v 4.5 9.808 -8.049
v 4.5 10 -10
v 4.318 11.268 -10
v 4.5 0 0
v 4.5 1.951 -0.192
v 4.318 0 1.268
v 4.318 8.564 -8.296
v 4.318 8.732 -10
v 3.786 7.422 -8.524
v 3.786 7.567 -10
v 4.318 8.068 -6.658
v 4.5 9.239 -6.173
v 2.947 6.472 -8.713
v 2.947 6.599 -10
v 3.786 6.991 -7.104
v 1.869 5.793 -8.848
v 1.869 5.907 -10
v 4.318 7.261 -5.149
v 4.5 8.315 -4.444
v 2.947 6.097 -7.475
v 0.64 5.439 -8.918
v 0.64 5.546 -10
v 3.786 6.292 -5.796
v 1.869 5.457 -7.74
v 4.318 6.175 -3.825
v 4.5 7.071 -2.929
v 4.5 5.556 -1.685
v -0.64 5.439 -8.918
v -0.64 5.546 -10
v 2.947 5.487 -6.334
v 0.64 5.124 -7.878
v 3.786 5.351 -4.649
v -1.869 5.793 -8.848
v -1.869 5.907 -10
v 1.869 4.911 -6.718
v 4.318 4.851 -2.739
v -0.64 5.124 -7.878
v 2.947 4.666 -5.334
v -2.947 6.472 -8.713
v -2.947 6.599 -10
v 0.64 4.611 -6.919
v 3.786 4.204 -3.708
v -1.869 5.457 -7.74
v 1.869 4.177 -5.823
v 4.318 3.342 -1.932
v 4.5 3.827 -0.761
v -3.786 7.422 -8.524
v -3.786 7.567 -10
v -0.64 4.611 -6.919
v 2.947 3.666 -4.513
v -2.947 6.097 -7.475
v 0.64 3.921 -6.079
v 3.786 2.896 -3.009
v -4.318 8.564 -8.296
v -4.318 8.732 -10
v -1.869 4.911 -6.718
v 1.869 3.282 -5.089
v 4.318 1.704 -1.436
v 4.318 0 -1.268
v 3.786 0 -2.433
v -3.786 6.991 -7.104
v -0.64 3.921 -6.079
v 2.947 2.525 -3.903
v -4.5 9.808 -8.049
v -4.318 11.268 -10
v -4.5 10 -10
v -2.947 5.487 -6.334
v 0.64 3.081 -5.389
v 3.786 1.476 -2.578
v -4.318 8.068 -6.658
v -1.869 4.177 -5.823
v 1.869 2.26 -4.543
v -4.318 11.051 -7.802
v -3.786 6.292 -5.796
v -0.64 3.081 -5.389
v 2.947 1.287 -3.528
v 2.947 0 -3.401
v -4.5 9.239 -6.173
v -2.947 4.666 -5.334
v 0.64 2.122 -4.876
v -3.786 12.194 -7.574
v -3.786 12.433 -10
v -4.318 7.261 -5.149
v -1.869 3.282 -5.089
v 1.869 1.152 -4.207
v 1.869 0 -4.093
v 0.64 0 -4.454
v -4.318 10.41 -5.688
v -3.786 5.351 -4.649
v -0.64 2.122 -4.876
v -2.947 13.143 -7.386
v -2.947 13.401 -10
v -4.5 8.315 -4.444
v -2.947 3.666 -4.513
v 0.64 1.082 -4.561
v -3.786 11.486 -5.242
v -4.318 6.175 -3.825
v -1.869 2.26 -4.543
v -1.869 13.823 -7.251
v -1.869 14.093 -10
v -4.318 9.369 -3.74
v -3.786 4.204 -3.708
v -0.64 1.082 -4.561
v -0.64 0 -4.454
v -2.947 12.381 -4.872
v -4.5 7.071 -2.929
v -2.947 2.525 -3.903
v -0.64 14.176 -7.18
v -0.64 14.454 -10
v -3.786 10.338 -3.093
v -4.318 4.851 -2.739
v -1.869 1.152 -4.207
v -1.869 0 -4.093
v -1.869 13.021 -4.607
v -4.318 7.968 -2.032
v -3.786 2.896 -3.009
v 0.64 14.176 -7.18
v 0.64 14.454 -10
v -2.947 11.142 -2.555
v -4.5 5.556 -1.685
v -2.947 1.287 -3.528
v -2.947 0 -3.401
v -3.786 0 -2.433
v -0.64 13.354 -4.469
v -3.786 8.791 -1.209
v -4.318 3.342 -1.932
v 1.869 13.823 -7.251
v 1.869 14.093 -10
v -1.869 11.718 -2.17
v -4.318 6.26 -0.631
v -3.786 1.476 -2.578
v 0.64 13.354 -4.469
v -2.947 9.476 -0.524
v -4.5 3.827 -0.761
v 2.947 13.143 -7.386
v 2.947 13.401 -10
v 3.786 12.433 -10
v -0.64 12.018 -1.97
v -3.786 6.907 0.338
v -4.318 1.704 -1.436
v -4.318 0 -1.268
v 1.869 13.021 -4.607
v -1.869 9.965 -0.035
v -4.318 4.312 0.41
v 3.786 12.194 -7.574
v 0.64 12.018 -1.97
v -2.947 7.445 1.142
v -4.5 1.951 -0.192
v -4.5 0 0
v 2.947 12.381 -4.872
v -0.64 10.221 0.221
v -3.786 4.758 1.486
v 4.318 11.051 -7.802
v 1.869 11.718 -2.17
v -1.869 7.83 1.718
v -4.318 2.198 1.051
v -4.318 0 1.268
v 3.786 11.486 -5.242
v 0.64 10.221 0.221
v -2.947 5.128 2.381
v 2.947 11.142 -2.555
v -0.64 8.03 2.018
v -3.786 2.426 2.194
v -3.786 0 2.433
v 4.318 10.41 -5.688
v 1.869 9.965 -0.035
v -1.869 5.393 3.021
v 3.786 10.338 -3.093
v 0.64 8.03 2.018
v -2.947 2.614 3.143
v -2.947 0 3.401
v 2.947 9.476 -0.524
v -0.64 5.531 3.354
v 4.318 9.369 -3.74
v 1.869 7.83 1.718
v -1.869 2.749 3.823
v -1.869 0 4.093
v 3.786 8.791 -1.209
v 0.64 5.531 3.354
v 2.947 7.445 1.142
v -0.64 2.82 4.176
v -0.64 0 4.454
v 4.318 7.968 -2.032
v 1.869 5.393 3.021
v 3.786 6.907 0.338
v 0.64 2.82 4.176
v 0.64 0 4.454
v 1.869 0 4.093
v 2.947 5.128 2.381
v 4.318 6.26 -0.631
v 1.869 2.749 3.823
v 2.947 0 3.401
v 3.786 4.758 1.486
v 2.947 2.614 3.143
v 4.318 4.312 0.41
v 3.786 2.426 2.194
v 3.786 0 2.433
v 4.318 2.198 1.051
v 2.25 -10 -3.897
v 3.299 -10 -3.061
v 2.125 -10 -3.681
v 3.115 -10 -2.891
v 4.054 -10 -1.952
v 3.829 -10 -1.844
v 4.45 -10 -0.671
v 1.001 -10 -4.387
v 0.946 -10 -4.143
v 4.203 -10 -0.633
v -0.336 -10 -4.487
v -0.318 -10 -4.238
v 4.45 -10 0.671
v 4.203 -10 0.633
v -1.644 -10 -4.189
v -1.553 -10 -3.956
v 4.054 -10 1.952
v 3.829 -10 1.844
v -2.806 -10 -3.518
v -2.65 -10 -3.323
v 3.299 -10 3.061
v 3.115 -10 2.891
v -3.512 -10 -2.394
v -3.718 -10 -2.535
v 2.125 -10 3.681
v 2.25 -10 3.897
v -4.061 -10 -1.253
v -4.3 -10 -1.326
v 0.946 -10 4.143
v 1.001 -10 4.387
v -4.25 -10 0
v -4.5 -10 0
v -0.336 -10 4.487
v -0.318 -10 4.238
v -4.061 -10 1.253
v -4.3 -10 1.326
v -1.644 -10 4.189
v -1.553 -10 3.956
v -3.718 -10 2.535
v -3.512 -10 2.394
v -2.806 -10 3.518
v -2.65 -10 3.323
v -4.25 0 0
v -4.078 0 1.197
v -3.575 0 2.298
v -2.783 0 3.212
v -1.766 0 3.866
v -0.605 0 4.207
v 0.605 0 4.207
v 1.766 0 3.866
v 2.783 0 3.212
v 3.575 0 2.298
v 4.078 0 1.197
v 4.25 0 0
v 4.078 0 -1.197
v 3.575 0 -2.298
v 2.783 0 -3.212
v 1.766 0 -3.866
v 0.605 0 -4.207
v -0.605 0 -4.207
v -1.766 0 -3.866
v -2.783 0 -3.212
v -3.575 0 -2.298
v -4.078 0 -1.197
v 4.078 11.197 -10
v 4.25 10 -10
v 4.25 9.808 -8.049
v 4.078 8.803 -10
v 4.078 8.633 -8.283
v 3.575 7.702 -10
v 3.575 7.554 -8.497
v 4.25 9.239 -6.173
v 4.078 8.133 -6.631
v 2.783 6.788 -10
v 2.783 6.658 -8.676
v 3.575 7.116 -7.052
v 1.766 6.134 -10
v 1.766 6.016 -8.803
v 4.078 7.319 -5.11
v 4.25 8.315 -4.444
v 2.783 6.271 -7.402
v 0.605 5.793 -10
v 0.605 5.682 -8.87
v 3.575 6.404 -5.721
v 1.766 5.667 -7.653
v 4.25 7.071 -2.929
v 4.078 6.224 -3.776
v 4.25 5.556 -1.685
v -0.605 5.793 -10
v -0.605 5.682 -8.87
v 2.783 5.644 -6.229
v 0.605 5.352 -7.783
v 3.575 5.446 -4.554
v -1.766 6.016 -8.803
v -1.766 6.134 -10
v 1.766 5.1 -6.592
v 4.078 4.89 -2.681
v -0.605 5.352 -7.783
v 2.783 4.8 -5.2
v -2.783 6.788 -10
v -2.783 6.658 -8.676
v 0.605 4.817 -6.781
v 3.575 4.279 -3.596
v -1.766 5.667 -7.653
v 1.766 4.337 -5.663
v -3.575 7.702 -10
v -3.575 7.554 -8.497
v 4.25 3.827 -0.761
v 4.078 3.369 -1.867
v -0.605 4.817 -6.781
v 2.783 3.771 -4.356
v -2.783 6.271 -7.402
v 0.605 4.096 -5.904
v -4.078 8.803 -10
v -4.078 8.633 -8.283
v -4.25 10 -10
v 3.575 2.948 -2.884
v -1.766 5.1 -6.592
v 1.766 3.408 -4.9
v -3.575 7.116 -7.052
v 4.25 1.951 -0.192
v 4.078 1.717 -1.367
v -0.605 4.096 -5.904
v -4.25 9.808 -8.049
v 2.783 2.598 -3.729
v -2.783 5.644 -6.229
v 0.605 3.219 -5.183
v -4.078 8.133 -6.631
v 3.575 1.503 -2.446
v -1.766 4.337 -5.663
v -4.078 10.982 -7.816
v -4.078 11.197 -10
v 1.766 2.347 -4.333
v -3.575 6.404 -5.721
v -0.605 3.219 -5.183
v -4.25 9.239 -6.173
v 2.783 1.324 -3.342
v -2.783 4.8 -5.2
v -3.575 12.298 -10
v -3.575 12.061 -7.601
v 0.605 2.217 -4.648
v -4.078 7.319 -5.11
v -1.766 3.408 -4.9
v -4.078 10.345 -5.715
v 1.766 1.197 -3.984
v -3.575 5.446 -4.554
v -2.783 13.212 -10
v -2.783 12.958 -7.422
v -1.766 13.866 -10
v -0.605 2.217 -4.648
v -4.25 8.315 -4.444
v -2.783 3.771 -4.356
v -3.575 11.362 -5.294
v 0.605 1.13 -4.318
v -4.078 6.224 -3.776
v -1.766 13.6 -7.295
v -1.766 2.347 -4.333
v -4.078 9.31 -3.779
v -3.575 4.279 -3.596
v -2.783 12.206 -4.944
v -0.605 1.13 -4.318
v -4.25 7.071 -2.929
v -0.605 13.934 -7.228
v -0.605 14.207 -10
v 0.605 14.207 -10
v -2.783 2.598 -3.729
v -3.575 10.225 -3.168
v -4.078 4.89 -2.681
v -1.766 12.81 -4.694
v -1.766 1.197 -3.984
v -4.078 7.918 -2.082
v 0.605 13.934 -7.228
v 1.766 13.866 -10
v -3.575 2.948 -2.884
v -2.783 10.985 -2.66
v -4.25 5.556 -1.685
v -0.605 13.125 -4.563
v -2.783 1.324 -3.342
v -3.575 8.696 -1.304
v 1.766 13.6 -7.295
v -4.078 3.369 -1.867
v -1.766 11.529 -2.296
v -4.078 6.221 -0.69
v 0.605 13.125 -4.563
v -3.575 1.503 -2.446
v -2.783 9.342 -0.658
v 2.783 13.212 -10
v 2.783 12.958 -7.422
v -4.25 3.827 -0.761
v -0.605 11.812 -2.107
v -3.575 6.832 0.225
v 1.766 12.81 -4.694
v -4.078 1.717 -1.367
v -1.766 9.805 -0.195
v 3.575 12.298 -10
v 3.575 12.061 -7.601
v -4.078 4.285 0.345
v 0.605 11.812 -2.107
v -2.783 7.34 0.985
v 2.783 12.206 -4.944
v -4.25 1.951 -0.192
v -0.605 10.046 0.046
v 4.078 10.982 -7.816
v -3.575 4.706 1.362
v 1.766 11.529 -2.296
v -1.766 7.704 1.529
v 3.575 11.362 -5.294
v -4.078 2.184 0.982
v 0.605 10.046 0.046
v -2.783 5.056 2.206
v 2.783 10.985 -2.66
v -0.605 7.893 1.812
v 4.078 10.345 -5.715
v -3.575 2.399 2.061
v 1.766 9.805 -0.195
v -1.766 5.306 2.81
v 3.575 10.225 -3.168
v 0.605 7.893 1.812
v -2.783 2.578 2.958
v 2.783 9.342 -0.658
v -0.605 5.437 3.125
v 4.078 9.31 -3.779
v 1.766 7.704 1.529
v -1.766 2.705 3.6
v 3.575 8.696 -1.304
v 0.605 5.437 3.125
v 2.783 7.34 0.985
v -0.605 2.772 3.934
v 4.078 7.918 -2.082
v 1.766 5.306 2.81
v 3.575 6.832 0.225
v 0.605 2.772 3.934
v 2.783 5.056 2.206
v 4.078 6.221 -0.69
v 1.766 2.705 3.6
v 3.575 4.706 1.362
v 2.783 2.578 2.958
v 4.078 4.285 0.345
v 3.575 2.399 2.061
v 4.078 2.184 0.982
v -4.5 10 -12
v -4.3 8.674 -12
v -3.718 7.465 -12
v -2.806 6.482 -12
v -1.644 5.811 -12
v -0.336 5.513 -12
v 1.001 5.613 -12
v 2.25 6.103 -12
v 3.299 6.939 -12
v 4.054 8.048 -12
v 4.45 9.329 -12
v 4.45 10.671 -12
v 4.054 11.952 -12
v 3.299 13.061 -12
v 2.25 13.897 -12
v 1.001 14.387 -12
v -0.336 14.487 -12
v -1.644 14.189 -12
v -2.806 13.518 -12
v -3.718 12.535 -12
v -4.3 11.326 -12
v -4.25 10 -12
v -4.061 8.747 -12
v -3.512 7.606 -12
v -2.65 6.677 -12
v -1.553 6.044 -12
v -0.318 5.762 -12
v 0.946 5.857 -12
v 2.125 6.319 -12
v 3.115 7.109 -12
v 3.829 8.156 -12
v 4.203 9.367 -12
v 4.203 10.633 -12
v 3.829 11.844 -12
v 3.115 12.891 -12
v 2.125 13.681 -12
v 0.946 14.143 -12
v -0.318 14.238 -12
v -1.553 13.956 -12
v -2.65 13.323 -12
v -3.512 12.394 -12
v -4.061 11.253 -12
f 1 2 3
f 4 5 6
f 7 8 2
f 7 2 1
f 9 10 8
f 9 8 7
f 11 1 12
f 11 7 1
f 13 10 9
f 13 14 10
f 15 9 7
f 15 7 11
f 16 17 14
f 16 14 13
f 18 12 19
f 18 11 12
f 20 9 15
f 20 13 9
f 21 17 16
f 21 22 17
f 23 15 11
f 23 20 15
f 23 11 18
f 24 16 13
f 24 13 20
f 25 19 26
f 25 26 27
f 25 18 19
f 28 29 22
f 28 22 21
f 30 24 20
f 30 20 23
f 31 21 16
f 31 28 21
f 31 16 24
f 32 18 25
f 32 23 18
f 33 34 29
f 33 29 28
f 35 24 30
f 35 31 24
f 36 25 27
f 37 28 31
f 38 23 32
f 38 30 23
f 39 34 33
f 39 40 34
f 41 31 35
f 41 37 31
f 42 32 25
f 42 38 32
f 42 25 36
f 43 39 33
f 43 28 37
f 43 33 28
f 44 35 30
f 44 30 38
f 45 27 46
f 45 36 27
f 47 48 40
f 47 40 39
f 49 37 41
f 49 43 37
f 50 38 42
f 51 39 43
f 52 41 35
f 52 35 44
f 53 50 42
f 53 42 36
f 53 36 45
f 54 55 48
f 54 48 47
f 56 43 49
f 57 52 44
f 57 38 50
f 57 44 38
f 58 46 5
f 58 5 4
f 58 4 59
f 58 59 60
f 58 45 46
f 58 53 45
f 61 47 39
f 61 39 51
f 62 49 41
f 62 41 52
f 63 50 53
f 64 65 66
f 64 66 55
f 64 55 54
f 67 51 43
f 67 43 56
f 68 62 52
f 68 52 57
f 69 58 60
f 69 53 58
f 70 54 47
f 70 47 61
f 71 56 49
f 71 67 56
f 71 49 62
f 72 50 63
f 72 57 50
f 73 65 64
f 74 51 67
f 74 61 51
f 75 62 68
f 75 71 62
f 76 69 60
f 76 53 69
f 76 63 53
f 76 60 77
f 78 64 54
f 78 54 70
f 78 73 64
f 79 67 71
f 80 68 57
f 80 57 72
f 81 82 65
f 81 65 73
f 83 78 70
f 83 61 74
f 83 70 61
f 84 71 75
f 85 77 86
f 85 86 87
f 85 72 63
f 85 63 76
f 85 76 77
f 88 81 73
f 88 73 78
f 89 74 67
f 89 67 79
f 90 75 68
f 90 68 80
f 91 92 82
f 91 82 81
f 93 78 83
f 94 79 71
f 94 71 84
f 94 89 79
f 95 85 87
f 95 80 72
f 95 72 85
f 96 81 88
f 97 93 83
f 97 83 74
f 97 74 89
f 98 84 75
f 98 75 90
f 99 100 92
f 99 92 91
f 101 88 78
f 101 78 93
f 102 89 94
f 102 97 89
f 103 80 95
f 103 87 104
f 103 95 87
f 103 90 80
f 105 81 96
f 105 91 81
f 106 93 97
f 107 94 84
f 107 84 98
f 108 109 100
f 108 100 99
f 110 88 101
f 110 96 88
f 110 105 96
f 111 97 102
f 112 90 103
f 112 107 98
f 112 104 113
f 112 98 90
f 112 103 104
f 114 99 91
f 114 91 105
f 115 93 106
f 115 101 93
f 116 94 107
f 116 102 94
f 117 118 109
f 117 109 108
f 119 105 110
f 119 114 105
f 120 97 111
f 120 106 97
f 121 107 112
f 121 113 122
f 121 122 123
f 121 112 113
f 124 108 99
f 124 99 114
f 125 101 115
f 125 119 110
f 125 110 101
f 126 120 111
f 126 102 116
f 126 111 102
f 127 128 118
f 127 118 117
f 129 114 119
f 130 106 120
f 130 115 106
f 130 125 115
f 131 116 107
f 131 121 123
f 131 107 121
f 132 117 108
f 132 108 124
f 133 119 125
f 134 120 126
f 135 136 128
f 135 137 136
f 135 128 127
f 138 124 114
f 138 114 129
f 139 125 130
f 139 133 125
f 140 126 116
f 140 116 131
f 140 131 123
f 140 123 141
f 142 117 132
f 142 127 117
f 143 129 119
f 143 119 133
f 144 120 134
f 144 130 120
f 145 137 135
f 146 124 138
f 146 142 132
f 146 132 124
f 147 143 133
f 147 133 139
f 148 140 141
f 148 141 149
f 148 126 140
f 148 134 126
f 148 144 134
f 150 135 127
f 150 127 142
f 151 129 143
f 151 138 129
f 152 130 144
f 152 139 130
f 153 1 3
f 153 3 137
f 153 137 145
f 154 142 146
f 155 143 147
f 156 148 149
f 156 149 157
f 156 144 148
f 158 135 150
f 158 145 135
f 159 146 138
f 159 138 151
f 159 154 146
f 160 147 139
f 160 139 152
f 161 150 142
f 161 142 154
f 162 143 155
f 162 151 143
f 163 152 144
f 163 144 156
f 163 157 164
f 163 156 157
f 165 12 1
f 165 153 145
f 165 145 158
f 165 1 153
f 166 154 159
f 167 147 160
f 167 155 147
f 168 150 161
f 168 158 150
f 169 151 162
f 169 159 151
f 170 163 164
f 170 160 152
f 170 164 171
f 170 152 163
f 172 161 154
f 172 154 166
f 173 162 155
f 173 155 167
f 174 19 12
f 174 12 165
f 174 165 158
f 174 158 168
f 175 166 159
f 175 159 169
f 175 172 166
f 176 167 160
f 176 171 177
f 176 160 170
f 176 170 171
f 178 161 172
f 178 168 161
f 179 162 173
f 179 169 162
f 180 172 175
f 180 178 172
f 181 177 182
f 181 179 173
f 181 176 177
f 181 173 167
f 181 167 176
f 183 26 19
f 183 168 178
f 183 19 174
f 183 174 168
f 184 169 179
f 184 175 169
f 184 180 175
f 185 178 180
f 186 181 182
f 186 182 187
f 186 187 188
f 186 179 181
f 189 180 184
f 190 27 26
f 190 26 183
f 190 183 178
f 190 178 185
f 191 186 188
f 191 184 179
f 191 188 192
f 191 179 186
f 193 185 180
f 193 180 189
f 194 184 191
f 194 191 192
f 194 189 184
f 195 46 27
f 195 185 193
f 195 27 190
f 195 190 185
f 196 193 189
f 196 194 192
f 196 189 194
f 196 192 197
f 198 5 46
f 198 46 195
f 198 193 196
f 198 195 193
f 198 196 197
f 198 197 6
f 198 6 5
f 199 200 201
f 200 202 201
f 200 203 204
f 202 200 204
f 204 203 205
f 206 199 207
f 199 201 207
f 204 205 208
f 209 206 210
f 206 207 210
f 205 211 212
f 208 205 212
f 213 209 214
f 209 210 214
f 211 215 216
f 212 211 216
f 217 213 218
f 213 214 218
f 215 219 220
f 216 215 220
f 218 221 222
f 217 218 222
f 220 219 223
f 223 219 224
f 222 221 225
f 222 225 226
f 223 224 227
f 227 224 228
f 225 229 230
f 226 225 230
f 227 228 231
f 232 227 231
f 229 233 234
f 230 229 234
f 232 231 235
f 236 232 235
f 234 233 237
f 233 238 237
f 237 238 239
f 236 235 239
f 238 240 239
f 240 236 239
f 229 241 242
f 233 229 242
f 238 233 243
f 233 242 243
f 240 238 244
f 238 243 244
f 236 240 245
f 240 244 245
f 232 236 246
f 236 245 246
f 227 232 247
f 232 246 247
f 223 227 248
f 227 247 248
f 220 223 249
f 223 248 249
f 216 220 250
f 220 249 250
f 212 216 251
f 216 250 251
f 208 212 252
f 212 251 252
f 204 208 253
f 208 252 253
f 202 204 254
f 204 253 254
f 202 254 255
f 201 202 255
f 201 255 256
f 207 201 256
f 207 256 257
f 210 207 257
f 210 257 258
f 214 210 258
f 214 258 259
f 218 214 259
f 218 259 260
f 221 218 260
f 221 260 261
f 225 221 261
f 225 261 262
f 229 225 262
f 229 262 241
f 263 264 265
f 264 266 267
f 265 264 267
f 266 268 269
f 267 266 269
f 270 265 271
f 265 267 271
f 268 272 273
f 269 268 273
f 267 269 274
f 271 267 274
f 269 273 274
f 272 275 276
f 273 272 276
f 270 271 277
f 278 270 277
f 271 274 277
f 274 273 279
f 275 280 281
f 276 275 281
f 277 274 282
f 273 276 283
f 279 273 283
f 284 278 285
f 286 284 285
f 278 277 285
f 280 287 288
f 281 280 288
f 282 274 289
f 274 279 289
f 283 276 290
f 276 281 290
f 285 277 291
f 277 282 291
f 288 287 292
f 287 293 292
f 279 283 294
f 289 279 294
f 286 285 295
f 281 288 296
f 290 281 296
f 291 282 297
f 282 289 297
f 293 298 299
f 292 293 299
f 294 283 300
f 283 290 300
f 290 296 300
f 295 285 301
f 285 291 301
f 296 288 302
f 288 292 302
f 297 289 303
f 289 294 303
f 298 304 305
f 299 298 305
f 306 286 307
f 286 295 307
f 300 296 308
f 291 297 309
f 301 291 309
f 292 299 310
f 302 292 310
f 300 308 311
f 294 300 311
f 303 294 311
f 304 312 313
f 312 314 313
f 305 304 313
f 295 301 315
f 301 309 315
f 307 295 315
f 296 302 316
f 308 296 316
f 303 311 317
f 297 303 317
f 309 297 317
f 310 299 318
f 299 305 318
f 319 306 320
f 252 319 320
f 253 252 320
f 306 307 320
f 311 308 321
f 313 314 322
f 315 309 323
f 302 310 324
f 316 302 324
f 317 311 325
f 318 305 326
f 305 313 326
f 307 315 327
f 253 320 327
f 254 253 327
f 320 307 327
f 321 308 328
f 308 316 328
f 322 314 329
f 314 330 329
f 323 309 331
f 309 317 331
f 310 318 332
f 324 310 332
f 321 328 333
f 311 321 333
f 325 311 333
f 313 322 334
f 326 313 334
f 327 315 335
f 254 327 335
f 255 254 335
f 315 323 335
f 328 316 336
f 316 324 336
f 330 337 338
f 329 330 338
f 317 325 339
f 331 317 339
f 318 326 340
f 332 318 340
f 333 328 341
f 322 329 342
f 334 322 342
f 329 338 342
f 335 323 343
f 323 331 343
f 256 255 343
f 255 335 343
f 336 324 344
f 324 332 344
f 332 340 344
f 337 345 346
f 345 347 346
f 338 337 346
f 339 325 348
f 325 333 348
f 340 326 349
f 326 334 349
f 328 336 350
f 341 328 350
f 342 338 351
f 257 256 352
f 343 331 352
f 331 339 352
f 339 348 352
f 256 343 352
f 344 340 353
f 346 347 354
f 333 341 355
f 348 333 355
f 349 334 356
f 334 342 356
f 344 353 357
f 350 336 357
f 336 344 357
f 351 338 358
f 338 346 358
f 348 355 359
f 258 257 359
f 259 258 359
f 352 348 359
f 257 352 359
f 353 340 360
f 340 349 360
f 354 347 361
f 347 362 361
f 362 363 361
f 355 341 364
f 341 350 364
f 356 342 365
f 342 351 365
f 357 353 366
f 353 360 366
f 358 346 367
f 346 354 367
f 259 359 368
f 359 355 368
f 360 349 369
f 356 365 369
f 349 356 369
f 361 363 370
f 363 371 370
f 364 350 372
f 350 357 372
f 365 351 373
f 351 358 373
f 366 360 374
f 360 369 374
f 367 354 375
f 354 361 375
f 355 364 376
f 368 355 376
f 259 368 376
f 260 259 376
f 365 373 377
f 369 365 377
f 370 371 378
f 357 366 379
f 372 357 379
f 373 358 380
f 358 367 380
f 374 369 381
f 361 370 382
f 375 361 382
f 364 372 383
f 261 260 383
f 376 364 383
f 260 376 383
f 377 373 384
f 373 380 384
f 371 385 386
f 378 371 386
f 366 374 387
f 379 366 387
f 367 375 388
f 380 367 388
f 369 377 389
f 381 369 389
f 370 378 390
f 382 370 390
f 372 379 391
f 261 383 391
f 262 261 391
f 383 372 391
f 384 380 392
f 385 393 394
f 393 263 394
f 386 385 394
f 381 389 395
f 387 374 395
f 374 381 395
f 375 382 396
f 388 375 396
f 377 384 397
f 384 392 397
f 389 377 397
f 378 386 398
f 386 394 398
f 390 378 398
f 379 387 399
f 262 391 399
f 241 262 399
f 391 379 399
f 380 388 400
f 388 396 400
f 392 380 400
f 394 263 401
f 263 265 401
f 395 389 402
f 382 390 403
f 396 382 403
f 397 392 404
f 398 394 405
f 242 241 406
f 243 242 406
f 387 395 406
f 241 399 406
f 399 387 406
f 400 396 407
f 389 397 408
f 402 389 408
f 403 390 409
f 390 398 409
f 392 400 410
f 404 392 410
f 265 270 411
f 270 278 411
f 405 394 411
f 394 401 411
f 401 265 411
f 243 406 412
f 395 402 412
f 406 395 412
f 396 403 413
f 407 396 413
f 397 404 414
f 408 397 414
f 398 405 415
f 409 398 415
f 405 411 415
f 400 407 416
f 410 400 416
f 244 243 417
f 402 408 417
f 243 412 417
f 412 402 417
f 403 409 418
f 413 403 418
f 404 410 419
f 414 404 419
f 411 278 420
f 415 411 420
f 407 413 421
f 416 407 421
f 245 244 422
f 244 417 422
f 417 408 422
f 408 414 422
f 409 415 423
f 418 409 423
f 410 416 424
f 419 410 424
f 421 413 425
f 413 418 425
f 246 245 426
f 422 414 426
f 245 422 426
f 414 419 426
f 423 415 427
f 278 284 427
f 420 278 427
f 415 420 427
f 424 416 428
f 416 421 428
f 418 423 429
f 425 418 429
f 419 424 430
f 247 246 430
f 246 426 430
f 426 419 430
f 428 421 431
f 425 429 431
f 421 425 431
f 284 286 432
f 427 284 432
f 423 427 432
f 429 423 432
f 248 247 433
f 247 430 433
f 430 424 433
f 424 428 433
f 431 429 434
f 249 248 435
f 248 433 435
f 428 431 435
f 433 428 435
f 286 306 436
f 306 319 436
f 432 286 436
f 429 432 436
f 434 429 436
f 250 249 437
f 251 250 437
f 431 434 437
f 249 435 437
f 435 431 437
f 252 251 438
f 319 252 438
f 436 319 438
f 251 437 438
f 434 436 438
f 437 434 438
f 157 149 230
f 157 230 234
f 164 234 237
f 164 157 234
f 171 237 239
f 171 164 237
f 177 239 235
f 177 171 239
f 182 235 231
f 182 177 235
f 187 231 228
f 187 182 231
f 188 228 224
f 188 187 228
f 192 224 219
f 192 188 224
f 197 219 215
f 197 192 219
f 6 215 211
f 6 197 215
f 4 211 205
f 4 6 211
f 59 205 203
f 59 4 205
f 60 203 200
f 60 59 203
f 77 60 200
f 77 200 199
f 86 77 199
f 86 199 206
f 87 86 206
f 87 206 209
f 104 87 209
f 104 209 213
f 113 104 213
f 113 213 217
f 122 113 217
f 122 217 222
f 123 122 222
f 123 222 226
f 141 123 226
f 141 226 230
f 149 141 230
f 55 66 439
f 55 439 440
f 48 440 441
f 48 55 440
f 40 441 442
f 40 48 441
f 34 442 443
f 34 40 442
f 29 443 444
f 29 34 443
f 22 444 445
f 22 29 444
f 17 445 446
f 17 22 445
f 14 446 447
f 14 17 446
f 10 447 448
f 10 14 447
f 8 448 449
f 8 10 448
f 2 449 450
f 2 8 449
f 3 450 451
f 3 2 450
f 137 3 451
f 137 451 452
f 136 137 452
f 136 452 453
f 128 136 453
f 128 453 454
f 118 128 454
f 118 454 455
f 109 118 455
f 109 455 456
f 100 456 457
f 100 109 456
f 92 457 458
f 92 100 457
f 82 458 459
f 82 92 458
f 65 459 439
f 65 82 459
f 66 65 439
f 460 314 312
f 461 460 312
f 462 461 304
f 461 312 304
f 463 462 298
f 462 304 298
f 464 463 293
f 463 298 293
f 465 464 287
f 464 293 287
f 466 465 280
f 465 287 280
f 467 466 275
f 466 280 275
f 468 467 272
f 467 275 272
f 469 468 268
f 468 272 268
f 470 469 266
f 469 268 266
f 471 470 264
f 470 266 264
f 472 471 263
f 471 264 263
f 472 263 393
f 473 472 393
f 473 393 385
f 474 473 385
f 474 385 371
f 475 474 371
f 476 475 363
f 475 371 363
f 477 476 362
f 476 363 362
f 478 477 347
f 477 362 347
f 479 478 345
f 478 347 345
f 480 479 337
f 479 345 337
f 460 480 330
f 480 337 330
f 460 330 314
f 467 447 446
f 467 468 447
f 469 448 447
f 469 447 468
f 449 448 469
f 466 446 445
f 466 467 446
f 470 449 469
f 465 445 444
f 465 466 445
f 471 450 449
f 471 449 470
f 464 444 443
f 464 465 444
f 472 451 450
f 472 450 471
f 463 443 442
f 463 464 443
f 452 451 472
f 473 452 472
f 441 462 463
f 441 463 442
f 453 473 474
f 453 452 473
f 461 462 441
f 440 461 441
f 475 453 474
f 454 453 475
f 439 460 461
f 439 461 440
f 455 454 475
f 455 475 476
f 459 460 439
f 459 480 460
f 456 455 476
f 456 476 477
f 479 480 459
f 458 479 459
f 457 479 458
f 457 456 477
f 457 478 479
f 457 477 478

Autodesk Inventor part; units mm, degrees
ref_plane "YZ Plane" through (0, 0, 0) normal (1, 0, 0) x (0, 1, 0)
ref_plane "XZ Plane" through (0, 0, 0) normal (0, 1, 0) x (-1, 0, 0)
ref_plane "XY Plane" through (0, 0, 0) normal (0, 0, 1) x (1, 0, 0)
sketch "Sketch1" plane through (0, 0, 0) normal (0, 1, 0) x (-1, 0, 0)
  circle A0 centre (0, 0) radius 4.5
  circle A1 centre (0, 0) radius 4.25
  dimension "d0" = 9
  dimension "d1" = 8.5
sketch "Sketch2" plane through (0, 0, 0) normal (1, 0, 0) x (0, 1, 0)
  line L0 (0, 0) -> (0, -10) construction
  arc A0 (10, -10) -> (0, 0) centre (0, -10) ccw
  dimension "d2" = 10
extrude "Extrusion1" add sketch "Sketch1" against normal blind 10
sketch "Sketch3" plane through (0, 0, 0) normal (0, 1, 0) x (1, 0, 0)
  circle A0 centre (0, 0) radius 4.25 projected
  circle A1 centre (0, 0) radius 4.5 projected
sweep "Sweep1" add profiles "Sketch3" path "Sketch2"
sketch "Sketch4" plane through (0, 10, -10) normal (0, 0, -1) x (-1, 0, 0)
  circle A0 centre (0, 0) radius 4.25 projected
  circle A1 centre (0, 0) radius 4.5 projected
  point P0 (0, -10)
extrude "Extrusion2" add sketch "Sketch4" along normal blind 2
properties part number "Rørende - water block"
